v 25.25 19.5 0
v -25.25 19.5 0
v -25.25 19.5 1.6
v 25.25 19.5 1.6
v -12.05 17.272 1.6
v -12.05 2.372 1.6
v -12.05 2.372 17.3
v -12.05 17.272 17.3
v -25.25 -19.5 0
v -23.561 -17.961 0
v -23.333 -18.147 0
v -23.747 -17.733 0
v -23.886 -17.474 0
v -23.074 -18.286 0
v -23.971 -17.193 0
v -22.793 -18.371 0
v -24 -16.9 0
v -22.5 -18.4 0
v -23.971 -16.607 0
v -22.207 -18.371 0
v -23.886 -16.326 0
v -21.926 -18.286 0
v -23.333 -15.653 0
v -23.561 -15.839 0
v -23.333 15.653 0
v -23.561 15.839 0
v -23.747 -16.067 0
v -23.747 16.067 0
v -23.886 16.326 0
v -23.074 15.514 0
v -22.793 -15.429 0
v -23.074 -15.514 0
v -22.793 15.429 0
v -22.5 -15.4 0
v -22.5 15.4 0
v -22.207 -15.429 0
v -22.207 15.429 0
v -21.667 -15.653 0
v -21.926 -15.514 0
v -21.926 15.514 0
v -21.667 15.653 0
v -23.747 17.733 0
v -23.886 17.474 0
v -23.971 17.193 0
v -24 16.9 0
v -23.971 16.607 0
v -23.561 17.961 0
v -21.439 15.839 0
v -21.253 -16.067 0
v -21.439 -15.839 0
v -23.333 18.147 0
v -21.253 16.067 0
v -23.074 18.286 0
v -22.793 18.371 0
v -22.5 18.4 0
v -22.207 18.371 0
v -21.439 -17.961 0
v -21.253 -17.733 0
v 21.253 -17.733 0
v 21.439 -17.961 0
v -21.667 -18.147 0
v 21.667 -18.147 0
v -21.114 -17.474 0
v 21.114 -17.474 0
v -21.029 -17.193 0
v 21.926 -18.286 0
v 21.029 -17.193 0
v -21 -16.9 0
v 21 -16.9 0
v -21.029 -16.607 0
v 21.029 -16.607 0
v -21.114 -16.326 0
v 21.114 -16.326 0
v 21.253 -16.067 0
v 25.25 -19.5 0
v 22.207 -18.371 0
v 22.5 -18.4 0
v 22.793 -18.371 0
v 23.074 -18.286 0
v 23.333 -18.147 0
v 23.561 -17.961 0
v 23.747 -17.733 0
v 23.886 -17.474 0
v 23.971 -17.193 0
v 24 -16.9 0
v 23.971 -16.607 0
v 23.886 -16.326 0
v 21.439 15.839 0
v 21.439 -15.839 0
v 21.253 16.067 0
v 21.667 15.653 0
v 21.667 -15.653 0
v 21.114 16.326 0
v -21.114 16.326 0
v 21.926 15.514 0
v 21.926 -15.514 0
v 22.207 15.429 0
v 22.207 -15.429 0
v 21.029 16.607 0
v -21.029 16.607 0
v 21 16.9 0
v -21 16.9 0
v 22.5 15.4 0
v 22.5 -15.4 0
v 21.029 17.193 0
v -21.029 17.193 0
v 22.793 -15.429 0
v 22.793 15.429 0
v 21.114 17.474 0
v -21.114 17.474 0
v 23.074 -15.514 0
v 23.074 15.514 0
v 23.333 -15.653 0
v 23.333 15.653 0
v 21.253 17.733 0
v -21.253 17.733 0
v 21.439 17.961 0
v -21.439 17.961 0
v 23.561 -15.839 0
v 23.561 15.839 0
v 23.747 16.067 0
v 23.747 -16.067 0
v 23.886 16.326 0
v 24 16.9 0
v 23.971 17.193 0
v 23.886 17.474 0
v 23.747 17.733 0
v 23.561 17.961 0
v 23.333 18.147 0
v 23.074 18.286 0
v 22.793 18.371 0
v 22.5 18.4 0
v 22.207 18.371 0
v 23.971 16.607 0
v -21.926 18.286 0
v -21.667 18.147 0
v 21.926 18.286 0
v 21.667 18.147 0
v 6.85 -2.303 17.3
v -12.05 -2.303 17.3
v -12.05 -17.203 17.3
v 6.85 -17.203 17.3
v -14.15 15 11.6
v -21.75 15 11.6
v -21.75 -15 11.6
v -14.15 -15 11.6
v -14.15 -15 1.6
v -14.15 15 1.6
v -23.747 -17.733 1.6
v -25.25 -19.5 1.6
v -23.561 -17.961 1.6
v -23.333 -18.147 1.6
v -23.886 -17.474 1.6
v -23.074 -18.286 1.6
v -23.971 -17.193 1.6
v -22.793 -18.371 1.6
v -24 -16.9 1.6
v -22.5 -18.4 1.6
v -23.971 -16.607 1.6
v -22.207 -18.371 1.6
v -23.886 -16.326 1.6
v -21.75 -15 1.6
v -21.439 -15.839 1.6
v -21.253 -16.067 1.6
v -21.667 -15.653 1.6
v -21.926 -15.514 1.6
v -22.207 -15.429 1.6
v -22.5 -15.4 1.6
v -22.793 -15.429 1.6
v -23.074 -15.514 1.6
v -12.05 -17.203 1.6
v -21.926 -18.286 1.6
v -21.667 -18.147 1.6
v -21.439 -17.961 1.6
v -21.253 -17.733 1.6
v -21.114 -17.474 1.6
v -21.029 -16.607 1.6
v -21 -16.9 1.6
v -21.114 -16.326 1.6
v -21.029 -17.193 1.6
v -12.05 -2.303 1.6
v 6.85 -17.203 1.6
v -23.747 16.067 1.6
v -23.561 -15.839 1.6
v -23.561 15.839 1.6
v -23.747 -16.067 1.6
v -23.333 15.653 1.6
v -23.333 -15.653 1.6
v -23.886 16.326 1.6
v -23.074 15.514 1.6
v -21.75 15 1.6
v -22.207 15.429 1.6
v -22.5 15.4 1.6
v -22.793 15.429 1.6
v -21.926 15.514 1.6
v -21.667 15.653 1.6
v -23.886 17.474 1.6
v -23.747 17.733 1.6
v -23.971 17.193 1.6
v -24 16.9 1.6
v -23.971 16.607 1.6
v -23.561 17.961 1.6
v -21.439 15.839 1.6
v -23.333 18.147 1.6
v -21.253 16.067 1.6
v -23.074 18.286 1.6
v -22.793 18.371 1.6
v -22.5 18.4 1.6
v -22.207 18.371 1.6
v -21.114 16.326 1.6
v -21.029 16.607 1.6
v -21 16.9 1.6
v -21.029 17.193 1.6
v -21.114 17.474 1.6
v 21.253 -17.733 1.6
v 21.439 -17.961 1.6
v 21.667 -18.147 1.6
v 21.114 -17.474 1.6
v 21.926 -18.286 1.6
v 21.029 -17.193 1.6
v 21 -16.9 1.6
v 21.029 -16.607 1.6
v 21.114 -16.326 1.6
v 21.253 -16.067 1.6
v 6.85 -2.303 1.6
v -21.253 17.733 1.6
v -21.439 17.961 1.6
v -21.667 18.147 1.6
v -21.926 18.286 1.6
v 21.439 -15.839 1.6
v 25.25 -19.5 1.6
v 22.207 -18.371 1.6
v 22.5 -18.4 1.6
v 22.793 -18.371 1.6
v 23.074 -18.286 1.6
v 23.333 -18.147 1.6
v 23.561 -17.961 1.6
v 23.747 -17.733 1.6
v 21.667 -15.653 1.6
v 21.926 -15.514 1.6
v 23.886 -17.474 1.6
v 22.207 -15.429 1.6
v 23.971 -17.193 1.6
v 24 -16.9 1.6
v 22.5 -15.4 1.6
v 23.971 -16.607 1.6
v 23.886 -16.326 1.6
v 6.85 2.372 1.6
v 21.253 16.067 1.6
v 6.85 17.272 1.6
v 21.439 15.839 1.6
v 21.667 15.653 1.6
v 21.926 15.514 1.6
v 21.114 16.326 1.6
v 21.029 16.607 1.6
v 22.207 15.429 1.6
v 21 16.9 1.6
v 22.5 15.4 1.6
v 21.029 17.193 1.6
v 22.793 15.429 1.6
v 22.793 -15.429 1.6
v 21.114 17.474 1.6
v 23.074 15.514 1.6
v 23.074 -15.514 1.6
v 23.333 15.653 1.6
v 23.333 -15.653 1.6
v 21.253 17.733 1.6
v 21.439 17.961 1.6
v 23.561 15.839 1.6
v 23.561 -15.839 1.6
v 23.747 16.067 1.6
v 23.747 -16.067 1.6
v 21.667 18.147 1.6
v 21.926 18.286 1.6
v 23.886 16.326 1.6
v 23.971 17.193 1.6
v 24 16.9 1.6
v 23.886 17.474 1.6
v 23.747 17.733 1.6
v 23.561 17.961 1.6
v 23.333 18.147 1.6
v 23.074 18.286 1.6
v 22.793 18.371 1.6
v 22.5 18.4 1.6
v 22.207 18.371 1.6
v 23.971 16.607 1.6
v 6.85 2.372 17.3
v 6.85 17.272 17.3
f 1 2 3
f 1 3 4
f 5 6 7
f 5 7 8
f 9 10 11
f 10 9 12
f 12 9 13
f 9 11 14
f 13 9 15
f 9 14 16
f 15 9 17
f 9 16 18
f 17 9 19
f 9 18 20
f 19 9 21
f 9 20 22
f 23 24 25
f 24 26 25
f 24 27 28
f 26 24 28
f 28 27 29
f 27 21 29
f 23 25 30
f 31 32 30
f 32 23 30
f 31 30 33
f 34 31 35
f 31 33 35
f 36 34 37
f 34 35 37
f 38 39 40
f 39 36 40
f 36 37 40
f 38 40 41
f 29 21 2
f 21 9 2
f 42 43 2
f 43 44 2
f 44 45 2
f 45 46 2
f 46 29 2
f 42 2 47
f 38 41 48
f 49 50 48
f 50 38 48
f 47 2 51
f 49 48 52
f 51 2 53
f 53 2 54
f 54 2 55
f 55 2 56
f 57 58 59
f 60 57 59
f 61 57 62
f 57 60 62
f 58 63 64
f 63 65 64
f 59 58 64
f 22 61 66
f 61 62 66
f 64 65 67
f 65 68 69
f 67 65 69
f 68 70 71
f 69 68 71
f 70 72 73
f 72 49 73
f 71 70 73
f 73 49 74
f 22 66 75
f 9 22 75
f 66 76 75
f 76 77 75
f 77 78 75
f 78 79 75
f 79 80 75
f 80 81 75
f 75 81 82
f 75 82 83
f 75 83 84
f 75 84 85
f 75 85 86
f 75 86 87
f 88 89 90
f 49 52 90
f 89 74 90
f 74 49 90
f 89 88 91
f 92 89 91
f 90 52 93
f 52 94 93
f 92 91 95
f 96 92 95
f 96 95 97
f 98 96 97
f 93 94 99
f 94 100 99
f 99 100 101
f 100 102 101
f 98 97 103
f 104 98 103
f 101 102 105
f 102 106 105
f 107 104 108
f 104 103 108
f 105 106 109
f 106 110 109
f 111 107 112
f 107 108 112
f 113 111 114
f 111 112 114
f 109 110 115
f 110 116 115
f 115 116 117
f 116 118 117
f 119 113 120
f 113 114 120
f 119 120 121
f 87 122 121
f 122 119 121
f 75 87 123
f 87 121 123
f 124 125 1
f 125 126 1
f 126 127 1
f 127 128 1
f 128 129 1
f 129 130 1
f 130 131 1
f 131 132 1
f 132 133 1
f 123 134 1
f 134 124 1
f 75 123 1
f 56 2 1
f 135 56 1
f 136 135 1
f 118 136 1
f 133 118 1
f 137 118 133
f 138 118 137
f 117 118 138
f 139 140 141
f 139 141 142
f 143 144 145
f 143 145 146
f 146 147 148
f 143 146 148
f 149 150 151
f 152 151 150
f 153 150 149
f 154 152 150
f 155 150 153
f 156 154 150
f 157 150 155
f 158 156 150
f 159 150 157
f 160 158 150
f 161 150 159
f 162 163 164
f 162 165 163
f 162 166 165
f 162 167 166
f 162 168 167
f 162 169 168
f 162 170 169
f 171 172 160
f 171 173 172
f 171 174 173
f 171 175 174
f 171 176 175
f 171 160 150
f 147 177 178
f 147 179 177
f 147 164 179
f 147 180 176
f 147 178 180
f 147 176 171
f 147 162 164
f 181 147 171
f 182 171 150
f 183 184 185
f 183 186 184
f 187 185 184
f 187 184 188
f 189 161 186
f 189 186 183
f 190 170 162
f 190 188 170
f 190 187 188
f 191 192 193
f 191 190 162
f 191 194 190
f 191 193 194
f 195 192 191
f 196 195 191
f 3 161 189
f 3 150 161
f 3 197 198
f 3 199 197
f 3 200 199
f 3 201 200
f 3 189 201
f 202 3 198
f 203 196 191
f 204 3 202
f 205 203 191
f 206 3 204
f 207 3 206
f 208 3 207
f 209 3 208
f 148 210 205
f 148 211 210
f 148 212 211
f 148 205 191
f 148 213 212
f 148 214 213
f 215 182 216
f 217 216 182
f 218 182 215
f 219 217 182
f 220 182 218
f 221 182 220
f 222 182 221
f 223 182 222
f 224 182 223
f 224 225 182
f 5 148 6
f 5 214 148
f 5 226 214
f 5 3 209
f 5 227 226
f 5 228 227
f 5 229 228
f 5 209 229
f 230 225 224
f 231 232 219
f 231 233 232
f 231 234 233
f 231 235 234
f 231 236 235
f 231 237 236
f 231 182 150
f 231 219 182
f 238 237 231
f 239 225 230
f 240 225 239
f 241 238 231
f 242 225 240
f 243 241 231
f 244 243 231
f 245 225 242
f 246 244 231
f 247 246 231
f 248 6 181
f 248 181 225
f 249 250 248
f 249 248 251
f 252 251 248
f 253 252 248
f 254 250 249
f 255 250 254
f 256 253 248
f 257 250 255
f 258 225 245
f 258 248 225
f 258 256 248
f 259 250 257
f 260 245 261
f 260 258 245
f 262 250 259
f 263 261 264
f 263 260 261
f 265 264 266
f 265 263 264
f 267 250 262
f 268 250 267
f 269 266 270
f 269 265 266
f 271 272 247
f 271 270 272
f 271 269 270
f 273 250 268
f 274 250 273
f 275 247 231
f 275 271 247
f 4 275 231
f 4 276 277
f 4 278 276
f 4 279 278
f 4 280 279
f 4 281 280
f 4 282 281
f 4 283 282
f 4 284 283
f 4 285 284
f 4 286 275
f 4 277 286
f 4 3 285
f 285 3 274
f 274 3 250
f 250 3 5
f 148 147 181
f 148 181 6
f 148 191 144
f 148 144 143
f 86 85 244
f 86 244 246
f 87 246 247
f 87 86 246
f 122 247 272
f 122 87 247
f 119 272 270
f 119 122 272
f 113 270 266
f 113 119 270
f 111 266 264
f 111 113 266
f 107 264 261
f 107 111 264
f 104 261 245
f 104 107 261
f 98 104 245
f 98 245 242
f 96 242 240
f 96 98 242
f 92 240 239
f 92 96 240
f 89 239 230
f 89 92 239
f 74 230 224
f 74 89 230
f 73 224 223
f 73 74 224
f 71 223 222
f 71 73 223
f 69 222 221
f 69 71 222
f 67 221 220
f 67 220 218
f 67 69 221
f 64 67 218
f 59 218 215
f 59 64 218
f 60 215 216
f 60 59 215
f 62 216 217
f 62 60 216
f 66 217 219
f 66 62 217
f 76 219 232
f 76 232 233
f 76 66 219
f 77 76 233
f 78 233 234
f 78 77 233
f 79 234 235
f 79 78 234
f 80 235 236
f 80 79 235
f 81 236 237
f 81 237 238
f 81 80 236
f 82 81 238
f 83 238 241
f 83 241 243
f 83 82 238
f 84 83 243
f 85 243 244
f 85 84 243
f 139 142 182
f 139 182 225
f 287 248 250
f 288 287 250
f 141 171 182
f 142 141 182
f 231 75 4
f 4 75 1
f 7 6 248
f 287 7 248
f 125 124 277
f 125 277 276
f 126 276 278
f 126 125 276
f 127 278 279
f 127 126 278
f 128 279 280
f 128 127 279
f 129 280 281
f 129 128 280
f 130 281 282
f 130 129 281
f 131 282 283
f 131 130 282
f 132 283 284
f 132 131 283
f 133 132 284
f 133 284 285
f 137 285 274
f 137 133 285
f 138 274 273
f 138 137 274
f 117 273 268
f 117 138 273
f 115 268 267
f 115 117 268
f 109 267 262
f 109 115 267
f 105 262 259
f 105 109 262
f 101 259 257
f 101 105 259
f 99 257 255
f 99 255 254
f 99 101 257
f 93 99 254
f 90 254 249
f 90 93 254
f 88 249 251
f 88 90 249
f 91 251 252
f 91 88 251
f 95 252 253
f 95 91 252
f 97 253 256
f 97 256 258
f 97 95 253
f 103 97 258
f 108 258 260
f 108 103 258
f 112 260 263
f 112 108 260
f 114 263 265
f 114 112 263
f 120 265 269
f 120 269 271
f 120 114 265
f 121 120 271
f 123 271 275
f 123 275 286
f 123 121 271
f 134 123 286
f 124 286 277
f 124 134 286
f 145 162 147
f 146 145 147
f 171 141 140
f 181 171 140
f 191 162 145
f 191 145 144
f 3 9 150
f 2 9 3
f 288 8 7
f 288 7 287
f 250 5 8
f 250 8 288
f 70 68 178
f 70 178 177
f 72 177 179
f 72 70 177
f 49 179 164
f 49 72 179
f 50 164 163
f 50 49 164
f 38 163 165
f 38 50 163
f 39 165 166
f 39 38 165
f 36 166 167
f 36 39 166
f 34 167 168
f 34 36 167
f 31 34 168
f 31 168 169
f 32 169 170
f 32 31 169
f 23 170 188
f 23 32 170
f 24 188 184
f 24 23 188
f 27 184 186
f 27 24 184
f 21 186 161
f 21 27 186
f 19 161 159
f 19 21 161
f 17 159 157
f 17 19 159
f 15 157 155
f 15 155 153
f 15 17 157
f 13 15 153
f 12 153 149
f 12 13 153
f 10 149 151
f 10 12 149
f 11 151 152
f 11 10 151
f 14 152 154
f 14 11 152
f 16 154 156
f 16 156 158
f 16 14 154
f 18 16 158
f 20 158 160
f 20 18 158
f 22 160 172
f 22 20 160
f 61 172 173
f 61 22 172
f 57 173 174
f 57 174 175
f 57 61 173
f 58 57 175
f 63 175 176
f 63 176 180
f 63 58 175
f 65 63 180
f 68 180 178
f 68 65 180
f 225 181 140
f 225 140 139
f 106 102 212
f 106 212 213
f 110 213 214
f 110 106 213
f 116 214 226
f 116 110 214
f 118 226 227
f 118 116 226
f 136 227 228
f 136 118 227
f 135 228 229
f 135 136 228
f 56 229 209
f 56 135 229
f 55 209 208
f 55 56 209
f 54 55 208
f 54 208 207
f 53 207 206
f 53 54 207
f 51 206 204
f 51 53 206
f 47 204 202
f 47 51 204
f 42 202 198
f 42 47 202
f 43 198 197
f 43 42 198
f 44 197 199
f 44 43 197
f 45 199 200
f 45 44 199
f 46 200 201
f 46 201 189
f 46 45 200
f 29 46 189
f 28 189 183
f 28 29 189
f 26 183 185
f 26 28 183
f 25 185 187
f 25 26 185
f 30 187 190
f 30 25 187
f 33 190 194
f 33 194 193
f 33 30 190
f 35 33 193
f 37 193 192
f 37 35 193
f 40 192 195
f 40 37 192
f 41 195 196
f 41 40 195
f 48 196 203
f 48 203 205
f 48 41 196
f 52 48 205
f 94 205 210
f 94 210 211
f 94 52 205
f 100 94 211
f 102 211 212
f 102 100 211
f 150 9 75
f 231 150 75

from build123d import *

# Parameters (mm, degrees)
F0_W     = 50.5
F0_H     = 39
F0_R     = 1.5
F1_DEPTH = 1.6
F2_W     = 18.9
F2_H     = 14.9
F3_DEPTH = 15.7
F4_W     = 7.6
F4_H     = 30
F5_DEPTH = 10


with BuildPart() as f1:
    # F0 (on Top) → F1 (new body)
    with BuildSketch(Plane.XY):
        Rectangle(F0_W, F0_H)
        with Locations((-22.5, -16.9)):
            Circle(F0_R, mode=Mode.SUBTRACT)
        with Locations((22.5, -16.9)):
            Circle(F0_R, mode=Mode.SUBTRACT)
        with Locations((-22.5, 16.9)):
            Circle(F0_R, mode=Mode.SUBTRACT)
        with Locations((22.5, 16.9)):
            Circle(F0_R, mode=Mode.SUBTRACT)
    extrude(amount=F1_DEPTH)

    # F2 (on face) → F3 (join)
    with BuildSketch(Plane.XY.offset(1.6)):
        with Locations((-2.6, 9.822445)):
            Rectangle(F2_W, F2_H)
        with Locations((-2.6, -9.752966)):
            Rectangle(F2_W, F2_H)
    extrude(amount=F3_DEPTH)

    # F4 (on face) → F5 (join)
    with BuildSketch(Plane.XY.offset(1.6)):
        with Locations((-17.95, 0)):
            Rectangle(F4_W, F4_H)
    extrude(amount=F5_DEPTH)


solid = f1.part
